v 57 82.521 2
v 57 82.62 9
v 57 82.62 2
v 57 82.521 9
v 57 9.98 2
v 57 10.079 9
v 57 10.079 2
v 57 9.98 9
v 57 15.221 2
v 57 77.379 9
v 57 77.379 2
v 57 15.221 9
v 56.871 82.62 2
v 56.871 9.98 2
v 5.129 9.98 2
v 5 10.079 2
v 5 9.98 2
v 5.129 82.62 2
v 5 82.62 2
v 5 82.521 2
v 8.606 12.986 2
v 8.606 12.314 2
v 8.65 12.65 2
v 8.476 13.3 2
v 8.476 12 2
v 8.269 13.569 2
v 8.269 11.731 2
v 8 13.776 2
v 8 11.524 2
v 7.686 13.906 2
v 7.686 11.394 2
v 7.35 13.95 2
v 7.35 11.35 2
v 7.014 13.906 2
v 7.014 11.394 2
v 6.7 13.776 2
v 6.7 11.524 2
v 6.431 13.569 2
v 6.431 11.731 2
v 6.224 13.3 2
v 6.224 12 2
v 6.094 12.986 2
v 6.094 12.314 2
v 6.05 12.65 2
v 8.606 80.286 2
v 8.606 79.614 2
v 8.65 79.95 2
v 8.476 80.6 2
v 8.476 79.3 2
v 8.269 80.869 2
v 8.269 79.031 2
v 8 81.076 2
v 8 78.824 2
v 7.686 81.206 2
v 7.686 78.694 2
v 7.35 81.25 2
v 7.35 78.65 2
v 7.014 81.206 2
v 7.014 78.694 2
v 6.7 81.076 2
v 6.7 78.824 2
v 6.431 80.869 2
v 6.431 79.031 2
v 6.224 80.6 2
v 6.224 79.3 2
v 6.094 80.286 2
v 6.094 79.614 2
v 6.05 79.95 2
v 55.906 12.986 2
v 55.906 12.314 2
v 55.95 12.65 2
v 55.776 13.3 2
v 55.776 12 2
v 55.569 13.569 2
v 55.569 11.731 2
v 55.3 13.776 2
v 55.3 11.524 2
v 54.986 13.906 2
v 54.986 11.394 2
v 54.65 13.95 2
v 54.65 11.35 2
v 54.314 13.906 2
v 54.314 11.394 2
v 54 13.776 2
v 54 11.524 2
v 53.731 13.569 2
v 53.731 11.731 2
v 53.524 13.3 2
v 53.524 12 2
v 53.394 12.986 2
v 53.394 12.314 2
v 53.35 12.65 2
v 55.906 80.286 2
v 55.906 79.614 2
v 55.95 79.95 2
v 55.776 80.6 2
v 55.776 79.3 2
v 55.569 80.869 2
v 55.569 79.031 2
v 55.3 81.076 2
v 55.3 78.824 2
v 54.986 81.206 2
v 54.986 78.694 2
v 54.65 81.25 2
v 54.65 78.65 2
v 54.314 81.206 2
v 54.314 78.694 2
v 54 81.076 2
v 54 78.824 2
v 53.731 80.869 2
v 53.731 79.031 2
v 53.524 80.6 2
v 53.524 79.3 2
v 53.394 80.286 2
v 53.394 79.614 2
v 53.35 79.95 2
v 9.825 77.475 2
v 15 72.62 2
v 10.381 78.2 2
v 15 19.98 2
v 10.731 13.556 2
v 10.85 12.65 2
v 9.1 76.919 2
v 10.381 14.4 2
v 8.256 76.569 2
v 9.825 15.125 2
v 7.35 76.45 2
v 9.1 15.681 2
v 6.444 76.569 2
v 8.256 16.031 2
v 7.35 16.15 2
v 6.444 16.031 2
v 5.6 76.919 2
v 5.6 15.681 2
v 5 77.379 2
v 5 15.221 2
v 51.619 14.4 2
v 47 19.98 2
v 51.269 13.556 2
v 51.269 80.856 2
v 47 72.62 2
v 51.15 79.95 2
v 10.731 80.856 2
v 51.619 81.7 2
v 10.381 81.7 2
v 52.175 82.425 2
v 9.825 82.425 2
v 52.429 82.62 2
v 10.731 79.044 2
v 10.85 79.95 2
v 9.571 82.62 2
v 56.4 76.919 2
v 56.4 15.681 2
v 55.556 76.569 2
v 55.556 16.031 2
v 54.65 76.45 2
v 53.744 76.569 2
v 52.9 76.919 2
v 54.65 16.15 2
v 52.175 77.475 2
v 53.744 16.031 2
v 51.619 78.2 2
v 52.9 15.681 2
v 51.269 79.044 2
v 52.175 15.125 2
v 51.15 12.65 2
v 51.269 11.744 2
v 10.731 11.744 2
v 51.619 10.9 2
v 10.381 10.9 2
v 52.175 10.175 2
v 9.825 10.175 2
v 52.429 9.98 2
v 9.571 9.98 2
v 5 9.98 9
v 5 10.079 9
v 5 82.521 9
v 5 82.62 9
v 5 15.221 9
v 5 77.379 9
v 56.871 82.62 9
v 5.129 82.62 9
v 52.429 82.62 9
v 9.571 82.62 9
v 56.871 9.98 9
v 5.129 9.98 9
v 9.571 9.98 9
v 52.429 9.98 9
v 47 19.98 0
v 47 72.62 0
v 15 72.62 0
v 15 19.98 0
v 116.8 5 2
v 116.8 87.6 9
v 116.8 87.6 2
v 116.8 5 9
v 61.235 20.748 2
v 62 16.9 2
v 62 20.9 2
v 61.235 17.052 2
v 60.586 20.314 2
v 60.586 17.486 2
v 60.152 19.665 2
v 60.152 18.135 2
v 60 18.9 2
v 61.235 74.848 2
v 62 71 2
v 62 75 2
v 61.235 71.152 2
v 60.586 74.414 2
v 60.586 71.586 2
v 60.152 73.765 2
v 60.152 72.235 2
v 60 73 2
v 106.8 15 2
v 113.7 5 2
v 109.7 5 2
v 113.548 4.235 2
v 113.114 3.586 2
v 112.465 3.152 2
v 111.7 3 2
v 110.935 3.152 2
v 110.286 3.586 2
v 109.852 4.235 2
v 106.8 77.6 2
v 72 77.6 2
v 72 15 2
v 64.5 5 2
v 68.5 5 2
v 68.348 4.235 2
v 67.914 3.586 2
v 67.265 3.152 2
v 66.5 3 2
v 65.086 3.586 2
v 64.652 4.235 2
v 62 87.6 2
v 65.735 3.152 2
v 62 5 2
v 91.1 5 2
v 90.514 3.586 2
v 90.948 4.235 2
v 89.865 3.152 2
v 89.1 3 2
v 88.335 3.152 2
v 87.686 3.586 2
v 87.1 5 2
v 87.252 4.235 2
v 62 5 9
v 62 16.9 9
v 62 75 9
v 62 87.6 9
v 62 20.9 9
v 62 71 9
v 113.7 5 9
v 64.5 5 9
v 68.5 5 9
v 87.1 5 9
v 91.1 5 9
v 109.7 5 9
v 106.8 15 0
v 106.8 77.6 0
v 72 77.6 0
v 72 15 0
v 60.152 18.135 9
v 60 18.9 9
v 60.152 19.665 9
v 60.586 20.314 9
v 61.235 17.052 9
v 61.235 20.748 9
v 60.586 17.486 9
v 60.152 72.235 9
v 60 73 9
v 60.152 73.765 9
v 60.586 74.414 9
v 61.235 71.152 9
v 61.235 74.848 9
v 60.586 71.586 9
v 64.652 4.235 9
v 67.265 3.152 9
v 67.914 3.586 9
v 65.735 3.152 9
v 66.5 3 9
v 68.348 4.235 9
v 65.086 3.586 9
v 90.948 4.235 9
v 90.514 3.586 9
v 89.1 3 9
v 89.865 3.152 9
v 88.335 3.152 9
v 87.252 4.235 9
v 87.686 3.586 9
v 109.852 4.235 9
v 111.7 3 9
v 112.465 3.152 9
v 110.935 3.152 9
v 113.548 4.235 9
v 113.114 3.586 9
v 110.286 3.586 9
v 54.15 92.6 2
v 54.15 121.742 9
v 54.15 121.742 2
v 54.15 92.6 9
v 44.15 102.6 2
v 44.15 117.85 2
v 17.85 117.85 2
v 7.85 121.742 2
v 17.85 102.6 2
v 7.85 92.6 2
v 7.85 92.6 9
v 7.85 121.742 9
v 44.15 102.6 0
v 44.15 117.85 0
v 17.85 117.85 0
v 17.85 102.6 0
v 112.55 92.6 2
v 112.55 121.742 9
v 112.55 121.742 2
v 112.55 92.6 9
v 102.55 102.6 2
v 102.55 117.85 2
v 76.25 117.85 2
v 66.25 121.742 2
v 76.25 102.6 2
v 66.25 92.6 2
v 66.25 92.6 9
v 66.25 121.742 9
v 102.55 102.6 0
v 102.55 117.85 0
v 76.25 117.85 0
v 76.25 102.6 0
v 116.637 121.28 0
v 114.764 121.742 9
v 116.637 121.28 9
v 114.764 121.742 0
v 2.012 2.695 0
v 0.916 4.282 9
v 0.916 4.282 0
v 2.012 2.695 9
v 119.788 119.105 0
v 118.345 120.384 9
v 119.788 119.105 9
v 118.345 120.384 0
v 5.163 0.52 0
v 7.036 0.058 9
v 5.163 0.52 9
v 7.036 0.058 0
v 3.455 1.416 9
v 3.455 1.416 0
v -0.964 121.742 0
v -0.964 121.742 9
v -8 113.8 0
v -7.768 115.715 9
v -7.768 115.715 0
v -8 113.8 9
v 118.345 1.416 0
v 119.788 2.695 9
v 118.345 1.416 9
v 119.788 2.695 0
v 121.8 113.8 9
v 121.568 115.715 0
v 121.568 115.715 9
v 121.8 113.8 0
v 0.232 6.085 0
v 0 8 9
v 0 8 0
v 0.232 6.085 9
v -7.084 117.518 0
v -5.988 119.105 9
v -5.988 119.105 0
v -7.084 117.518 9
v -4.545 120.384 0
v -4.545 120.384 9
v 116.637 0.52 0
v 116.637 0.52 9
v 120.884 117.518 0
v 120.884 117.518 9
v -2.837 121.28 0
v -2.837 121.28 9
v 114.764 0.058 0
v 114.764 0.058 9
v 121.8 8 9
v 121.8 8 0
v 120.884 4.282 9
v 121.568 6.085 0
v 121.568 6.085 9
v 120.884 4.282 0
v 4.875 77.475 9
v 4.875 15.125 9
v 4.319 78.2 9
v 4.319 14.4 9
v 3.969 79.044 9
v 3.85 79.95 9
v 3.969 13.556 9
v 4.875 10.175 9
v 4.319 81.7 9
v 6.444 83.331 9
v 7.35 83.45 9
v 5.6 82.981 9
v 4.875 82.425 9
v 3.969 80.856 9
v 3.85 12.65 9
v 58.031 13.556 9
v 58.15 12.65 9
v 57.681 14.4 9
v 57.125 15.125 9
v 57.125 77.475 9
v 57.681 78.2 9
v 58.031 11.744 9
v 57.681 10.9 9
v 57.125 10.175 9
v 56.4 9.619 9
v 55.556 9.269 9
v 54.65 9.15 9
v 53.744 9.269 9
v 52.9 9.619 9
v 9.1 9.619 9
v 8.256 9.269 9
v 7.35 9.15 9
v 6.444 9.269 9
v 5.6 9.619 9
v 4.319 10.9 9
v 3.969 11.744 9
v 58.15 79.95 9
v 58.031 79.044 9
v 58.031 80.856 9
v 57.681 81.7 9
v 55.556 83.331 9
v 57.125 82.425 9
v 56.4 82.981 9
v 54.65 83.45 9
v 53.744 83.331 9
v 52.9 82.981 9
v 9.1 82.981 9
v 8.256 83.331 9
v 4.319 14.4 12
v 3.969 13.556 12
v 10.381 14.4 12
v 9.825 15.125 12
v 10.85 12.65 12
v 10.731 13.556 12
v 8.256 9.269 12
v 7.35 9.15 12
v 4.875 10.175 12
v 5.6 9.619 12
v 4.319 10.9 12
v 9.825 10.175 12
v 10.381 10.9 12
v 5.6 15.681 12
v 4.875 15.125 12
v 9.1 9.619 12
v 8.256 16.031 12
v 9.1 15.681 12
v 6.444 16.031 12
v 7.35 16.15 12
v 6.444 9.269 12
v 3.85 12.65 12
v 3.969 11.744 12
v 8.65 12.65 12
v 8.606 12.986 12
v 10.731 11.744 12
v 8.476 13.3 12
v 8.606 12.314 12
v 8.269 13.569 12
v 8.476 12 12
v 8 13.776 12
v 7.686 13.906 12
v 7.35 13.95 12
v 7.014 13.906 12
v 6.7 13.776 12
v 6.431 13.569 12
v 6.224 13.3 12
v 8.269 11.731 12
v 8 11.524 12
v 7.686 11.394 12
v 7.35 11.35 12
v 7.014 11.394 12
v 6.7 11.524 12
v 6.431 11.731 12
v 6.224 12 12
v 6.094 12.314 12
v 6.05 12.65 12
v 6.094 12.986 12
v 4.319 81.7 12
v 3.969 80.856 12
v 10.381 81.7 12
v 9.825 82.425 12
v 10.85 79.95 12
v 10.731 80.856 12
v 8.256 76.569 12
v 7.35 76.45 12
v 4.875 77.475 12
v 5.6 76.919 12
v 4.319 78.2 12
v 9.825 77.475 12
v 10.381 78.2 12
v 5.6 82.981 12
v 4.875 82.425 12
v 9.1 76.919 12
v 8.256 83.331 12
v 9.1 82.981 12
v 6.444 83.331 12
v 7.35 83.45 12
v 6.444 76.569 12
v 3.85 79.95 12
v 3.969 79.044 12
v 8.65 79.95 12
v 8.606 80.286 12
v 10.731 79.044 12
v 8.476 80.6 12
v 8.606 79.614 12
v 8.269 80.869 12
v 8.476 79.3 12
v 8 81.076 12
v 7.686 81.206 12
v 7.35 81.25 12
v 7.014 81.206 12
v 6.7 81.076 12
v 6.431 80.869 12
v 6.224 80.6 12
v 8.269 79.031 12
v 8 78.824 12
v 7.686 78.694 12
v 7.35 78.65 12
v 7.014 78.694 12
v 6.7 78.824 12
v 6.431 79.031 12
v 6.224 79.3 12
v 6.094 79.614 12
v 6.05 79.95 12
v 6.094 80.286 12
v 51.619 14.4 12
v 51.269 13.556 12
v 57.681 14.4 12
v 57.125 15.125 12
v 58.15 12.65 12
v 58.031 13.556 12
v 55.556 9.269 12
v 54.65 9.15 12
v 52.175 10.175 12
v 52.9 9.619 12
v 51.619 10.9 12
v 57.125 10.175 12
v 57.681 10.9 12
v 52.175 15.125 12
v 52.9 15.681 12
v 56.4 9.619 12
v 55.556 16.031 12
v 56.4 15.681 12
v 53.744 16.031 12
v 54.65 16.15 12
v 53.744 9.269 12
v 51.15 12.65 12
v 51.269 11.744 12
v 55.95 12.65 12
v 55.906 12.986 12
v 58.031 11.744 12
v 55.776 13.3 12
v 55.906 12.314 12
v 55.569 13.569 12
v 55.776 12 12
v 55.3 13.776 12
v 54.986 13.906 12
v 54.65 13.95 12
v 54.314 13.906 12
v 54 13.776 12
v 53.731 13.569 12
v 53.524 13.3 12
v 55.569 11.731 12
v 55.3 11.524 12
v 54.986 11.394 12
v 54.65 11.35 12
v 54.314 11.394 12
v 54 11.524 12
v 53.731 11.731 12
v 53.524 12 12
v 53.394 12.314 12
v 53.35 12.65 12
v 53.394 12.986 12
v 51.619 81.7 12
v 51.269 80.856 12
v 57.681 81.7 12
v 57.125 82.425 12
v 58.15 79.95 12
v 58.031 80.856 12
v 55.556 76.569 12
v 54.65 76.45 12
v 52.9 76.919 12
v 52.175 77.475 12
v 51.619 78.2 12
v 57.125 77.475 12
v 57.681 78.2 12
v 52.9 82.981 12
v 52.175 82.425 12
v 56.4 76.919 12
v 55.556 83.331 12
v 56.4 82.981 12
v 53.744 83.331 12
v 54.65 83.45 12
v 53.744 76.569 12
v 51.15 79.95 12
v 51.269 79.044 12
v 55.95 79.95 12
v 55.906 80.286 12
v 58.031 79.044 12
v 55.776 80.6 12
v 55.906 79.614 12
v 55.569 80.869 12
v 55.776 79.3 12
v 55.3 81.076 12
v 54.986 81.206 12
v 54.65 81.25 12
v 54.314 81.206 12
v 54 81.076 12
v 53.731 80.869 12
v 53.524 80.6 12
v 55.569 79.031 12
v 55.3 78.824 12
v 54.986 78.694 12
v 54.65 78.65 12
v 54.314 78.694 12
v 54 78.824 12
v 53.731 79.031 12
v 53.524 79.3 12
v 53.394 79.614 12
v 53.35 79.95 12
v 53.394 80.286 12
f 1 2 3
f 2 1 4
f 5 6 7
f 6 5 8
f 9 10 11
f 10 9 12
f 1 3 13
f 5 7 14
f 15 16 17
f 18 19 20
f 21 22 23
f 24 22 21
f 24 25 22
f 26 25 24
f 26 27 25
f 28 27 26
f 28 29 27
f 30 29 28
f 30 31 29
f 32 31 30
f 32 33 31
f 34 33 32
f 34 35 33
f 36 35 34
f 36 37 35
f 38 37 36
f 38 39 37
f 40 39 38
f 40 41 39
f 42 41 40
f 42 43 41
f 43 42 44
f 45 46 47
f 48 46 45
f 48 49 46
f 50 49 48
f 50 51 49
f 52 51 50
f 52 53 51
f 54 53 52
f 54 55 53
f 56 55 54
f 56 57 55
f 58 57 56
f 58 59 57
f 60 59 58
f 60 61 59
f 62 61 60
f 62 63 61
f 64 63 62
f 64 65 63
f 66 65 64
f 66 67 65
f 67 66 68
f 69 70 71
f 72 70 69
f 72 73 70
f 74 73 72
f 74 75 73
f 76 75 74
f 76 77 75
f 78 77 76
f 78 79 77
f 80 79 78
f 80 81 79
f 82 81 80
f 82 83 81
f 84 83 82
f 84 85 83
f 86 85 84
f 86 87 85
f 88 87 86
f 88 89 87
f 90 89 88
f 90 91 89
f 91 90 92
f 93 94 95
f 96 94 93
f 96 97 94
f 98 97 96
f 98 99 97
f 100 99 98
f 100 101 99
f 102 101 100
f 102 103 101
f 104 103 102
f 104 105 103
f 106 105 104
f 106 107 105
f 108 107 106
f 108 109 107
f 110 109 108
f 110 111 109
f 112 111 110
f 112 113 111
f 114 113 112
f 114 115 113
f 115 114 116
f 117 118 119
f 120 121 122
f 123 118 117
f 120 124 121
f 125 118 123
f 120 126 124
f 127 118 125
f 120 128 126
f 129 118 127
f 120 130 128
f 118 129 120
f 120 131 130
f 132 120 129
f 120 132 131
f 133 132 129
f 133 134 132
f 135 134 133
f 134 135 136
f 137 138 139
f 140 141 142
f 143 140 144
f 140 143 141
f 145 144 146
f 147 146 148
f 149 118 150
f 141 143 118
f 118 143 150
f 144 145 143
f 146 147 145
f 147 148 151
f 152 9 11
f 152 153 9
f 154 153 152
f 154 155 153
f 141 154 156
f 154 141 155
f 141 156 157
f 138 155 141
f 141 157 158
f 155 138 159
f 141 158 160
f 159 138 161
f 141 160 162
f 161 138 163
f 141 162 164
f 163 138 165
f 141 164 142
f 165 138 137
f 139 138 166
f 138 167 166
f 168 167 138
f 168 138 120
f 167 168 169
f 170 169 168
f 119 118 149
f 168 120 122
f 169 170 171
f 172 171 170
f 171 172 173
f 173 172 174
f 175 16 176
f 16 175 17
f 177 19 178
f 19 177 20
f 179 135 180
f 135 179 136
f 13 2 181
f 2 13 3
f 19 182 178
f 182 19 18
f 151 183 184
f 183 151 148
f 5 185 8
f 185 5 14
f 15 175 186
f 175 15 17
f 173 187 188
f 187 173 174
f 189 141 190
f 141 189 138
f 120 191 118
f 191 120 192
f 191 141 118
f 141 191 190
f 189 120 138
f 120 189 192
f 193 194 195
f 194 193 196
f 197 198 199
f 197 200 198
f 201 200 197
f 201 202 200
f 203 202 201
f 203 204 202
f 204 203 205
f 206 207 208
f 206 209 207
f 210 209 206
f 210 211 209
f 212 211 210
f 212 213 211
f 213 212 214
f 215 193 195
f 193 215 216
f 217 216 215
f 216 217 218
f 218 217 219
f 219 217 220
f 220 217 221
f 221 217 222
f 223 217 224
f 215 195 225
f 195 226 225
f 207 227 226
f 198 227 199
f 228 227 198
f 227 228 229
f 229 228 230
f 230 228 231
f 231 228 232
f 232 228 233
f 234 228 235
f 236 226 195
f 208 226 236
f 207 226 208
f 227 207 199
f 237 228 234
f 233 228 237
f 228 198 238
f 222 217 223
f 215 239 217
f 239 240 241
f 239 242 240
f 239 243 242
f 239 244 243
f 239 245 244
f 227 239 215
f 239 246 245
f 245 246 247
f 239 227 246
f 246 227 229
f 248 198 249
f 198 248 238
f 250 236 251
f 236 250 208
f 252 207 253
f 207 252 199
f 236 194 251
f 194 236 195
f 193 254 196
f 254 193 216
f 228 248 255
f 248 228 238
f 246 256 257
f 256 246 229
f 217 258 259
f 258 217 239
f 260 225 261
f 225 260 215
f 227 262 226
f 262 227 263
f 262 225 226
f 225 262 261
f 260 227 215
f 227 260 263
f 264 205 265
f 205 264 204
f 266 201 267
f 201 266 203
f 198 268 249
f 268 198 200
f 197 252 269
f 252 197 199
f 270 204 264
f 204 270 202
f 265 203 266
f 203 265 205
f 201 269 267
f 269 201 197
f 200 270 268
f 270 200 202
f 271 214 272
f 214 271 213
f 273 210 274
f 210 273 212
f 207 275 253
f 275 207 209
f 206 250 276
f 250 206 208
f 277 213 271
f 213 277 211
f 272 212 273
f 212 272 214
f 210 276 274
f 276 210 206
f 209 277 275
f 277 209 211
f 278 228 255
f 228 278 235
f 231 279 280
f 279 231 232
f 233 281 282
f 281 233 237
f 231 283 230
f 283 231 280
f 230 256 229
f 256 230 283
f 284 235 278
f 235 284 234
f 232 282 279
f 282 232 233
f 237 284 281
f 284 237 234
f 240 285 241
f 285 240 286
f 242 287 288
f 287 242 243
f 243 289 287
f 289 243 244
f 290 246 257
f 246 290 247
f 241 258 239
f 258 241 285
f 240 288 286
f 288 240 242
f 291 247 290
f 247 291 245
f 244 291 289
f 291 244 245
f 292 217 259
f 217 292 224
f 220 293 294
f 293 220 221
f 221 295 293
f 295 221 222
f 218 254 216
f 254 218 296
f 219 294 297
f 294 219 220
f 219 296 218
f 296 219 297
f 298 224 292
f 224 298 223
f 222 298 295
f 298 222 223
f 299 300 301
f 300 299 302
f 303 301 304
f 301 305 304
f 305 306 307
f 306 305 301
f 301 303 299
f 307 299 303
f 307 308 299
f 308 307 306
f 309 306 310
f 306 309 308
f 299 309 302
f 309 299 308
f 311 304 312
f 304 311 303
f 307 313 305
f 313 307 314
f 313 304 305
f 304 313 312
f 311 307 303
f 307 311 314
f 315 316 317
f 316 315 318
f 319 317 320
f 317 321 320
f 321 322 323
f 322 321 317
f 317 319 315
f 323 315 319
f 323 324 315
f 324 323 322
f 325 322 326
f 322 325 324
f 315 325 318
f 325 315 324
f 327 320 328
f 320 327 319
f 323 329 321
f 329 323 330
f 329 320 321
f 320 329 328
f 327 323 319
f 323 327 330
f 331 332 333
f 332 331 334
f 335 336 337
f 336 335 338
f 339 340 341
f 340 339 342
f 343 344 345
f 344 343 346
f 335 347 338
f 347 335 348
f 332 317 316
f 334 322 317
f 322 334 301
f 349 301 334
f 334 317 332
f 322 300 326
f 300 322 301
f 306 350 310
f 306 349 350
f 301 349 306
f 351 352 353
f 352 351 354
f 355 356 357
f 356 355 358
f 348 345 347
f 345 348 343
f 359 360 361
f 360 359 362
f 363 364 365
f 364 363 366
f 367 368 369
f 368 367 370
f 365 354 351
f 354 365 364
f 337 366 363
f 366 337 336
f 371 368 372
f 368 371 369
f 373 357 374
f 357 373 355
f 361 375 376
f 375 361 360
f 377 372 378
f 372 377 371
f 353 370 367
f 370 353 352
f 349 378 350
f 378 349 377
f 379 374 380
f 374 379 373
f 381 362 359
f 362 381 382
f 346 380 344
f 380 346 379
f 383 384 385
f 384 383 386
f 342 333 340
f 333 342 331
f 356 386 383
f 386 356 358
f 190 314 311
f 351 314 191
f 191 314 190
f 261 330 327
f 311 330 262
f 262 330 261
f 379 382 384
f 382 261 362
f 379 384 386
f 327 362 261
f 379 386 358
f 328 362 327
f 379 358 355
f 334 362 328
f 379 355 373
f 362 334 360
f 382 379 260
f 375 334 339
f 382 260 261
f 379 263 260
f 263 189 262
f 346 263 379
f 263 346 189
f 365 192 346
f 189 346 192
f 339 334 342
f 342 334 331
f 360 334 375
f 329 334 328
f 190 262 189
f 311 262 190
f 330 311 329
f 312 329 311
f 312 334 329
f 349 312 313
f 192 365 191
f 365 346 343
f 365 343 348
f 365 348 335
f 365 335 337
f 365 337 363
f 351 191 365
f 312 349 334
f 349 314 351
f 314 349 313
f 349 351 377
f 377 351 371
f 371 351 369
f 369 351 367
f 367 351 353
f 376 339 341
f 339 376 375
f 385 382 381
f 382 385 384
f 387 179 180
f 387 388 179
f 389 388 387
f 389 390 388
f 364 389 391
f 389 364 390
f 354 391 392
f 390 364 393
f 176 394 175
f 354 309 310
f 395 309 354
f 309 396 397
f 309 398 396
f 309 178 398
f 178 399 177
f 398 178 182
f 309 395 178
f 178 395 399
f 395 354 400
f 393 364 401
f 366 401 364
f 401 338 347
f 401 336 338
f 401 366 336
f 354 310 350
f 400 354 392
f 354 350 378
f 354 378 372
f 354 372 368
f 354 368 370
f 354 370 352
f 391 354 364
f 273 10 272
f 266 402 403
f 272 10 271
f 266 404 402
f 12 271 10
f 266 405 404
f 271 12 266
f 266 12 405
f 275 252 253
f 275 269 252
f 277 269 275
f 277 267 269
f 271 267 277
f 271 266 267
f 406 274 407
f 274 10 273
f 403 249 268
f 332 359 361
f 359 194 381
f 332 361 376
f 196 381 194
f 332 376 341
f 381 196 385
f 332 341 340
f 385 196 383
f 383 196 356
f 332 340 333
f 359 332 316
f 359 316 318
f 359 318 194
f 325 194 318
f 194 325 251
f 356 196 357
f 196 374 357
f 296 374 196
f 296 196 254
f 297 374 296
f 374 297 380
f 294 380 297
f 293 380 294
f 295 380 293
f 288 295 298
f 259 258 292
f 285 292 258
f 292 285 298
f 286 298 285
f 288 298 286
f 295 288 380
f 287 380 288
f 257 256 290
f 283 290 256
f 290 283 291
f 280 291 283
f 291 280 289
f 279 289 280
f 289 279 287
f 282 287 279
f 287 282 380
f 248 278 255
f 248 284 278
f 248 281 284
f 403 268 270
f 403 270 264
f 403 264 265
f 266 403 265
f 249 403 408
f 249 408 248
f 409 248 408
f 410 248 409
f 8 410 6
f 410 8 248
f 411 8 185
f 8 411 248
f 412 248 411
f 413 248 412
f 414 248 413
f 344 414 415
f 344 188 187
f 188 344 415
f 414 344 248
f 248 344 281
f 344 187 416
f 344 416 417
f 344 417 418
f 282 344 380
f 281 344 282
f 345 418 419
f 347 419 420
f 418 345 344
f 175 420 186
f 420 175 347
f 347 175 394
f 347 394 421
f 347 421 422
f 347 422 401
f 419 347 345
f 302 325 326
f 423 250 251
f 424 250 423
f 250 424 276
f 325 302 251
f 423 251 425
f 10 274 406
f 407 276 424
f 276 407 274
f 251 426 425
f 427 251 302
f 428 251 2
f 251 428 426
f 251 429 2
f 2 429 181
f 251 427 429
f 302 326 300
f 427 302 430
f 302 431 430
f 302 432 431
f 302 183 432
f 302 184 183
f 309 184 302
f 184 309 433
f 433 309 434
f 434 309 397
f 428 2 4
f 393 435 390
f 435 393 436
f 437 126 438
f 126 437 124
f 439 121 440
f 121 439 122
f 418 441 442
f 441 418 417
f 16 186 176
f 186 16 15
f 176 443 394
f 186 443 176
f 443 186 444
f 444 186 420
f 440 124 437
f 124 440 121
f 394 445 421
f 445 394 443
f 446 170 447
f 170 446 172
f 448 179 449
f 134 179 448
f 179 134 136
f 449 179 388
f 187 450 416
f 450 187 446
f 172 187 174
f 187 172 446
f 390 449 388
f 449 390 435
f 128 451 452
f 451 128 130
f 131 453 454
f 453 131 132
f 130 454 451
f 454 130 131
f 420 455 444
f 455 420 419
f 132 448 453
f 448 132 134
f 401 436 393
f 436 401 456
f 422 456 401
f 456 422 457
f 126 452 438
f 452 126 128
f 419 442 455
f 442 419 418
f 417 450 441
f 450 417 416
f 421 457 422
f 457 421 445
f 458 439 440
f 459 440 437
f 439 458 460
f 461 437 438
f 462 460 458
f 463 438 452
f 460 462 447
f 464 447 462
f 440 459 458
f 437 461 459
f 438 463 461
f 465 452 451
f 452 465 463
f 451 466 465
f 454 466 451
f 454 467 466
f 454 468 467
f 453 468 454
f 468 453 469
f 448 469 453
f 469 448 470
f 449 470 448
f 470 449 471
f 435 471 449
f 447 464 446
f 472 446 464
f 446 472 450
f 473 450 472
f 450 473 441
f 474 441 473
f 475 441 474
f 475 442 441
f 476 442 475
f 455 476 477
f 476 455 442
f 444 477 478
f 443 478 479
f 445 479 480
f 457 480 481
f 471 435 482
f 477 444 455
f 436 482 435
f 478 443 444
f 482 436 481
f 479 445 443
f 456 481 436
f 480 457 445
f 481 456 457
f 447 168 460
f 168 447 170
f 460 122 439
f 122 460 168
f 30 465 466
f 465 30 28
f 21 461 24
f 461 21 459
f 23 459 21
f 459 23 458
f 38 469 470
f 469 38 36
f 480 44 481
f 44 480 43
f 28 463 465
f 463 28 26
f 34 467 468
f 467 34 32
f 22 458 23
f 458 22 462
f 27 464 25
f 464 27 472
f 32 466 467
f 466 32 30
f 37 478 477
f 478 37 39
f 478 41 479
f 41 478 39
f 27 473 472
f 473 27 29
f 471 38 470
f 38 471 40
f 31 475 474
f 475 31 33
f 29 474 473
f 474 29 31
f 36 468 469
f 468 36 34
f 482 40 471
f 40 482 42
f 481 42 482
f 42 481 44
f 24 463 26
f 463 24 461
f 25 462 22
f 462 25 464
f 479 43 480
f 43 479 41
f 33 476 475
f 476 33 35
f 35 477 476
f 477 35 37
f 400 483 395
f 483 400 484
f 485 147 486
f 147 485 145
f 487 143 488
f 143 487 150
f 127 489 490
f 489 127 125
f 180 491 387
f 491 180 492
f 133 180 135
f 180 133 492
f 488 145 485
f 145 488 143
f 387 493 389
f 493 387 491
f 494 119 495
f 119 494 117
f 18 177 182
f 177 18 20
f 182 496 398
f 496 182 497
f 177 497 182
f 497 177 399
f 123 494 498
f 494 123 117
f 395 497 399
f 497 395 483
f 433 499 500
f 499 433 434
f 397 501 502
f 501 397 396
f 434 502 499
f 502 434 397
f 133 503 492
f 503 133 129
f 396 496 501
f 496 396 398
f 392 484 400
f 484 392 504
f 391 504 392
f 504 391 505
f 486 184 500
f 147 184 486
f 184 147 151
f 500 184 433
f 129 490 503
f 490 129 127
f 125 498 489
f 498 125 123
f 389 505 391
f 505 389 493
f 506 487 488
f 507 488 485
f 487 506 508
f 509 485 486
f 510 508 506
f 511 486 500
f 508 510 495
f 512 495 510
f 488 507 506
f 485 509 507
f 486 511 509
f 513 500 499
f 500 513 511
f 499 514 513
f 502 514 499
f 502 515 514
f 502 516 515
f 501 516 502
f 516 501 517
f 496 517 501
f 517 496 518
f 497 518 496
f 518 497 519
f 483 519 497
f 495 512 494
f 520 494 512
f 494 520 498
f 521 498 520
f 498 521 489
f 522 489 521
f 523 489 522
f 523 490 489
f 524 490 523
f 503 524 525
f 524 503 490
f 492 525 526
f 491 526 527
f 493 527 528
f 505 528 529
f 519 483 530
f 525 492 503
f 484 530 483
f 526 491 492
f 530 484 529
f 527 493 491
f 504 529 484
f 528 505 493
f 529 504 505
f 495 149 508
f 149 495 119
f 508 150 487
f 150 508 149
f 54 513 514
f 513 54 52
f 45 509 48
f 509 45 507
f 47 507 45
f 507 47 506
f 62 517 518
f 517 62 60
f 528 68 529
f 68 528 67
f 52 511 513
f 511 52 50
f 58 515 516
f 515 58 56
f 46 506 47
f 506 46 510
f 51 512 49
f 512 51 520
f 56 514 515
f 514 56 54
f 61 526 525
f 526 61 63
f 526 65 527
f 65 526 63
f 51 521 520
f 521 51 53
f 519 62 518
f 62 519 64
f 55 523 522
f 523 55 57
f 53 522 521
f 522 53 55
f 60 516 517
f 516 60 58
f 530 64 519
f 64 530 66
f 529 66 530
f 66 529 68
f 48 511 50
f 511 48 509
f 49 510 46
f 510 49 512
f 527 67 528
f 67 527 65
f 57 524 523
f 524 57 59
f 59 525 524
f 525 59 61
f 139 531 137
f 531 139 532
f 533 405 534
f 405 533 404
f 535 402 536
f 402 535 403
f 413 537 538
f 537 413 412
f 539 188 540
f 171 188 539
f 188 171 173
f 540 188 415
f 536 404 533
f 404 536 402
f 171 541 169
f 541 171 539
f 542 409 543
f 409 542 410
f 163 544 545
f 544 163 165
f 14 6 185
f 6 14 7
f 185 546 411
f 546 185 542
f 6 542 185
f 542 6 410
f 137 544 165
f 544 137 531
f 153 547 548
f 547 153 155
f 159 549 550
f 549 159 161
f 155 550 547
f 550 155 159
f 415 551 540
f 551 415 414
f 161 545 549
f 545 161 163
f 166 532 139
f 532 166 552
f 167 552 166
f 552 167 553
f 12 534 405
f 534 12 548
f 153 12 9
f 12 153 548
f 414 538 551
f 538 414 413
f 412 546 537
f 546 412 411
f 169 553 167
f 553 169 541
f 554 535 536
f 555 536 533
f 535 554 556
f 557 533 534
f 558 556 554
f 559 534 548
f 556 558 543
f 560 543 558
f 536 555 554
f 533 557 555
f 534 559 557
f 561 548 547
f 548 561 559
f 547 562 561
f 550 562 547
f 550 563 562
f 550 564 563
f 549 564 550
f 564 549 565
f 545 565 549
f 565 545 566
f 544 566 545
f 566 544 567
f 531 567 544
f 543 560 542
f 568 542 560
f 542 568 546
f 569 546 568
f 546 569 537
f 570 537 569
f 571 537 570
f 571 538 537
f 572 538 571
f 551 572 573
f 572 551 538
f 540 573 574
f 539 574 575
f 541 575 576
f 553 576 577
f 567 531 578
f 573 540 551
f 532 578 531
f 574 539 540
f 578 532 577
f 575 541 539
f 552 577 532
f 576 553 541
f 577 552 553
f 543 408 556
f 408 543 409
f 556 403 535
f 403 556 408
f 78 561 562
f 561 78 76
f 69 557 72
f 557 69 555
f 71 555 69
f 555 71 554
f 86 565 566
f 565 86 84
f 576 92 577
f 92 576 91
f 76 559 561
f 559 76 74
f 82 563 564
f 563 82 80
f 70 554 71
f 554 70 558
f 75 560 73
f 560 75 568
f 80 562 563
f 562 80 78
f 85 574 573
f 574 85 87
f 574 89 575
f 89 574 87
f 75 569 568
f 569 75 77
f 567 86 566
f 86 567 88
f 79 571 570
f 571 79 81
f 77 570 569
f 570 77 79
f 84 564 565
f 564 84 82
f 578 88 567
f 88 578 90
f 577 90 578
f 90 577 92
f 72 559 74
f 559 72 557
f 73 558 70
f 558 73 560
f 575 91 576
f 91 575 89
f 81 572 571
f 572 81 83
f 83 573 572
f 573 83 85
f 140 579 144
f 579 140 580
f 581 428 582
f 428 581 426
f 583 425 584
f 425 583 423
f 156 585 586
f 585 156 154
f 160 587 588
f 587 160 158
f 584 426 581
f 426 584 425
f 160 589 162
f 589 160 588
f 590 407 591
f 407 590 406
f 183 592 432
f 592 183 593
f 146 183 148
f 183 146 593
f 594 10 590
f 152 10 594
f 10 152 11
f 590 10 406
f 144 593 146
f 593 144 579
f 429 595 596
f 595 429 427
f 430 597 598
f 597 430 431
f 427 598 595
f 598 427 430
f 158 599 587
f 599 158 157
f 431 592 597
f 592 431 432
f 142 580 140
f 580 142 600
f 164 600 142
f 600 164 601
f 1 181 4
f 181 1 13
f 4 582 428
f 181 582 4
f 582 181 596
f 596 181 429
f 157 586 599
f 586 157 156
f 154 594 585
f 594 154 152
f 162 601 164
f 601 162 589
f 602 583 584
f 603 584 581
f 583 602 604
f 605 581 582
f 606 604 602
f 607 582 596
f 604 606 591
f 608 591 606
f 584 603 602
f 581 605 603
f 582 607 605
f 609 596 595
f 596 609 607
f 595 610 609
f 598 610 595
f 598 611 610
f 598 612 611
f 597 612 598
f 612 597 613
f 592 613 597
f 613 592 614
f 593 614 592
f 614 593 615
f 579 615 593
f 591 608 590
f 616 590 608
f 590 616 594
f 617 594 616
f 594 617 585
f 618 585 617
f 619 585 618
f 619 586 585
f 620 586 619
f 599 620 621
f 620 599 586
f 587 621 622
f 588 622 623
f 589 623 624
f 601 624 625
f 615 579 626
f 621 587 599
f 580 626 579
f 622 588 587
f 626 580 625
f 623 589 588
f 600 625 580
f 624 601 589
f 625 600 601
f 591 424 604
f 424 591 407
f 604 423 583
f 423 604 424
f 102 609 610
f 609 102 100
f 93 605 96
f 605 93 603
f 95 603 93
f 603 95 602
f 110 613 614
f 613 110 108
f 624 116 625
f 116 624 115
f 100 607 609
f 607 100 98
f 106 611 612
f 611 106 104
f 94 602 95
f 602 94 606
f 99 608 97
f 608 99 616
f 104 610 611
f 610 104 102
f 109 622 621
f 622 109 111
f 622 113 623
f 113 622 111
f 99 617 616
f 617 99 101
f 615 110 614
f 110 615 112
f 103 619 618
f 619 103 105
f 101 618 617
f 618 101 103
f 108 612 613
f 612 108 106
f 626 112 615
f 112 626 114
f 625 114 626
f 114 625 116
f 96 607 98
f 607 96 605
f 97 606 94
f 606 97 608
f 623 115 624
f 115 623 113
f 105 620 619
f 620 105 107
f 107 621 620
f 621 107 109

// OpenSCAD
// file: roundedsquare.scad
module roundedSquare(size=[10,10], radius=1, center=false) {
    translate(center ? -size/2 : [0,0])
    hull() {
        translate([radius,radius]) circle(r=radius);
        translate([size[0]-radius,radius]) circle(r=radius);
        translate([size[0]-radius,size[0]-radius]) circle(r=radius);
        translate([0,size[0]-radius]) circle(r=radius);
    }
}
// main file
use <roundedsquare.scad>;

baseThickness = 2;
spacing = 5;
corner = 8;
undersideRimWidth = 10;
rimHeight = 7;

fpgaSizeX = 52;
fpgaSizeY = 72.64;
fpgaScrewSpacingX = 47.3;
fpgaScrewSpacingY = 67.3;


breadboardTolerance = 0.3;

// set to zero to omit small breadboards
smallBreadboardSizeX = 45.7;
smallBreadboardSizeY = 34.65;

bigBreadboardSizeX = 54.2;
bigBreadboardSizeY = 82;

bigBreadboardNubDiameter = 4;
bigBreadboardNubPositions = [ [0,13.9], [0,68], [4.5,0], [27.1,0], [49.7,0] ];

screwHoleSize = 2.6;
screwLength = 10;
screwPillarDiameter = 7;
fpgaHeightAboveBottom = 12;

module dummy() {}

nudge = 0.01;

smallBB = smallBreadboardSizeX > 0 && smallBreadboardSizeY > 0;

row1Height = max(fpgaSizeY, bigBreadboardSizeY+2*breadboardTolerance);
row2Height = smallBreadboardSizeY+2*breadboardTolerance;
col1Width = max(fpgaSizeX, smallBreadboardSizeX+2*breadboardTolerance);
col2Width = max(bigBreadboardSizeX+2*breadboardTolerance,smallBreadboardSizeX+2*breadboardTolerance);
width = col1Width+col2Width+3*spacing;
height = smallBB ? (row1Height+row2Height+3*spacing) : (row1Height+2*spacing);

col1X = spacing+0.5*col1Width;
col2X = 2*spacing+col1Width+0.5*col2Width;
row1Y = spacing+0.5*row1Height;
row2Y = row1Height+2*spacing+0.5*row2Height;

fpgaHoleXSize = fpgaSizeX-2*undersideRimWidth;
fpgaHoleYSize = fpgaSizeY-2*undersideRimWidth;

// cube centered in xy plane
module cCube(dimensions) {
    translate([-dimensions[0]/2,-dimensions[1]/2,0]) cube(dimensions);
}

module cutout(w,h) {
    translate([0,0,baseThickness]) cCube([w,h,rimHeight+nudge]);
    translate([0,0,-nudge]) cCube([w-2*undersideRimWidth,h-2*undersideRimWidth,baseThickness+2*nudge]);
}

module removers(x,y,width,height) {
    translate([x-width/2,y,baseThickness]) scale([0.9,1.25,1]) cylinder(d=spacing,h=rimHeight+nudge,$fn=36);
    translate([x+width/2,y,baseThickness]) scale([0.9,1.25,1])cylinder(d=spacing,h=rimHeight+nudge,$fn=36);
}

module screwPillar() {
    $fn = 24;
    render(convexity=2)
    difference() {
        cylinder(d=screwPillarDiameter,h=fpgaHeightAboveBottom);
        translate([0,0,fpgaHeightAboveBottom-screwLength])
        cylinder(d=screwHoleSize,h=screwLength+nudge);
    }
}

render(convexity=4)
difference() {
    linear_extrude(rimHeight+baseThickness) roundedSquare([width,height],radius=corner);
    translate([col1X,row1Y,0]) cutout(fpgaSizeX,fpgaSizeY);
    translate([col2X,row1Y,0]) cutout(bigBreadboardSizeX+2*breadboardTolerance,bigBreadboardSizeY+2*breadboardTolerance);
//    removers(col2X,row1Y,bigBreadboardSizeX+2*breadboardTolerance,bigBreadboardSizeY+2*breadboardTolerance);
    for (xy=bigBreadboardNubPositions) 
        translate([col2X-(bigBreadboardSizeX+2*breadboardTolerance)/2+xy[0],row1Y-(bigBreadboardSizeY+2*breadboardTolerance)/2+xy[1],baseThickness]) cylinder(d=bigBreadboardNubDiameter,h=rimHeight+nudge,$fn=16);
    if (smallBB) {
 //       removers(col1X,row2Y,smallBreadboardSizeX+2*breadboardTolerance,smallBreadboardSizeY+2*breadboardTolerance);
//        removers(col2X,row2Y,smallBreadboardSizeX+2*breadboardTolerance,smallBreadboardSizeY+2*breadboardTolerance);
        translate([col1X,row2Y,0]) cutout(smallBreadboardSizeX+2*breadboardTolerance,smallBreadboardSizeY+2*breadboardTolerance);
        translate([col2X,row2Y,0]) cutout(smallBreadboardSizeX+2*breadboardTolerance,smallBreadboardSizeY+2*breadboardTolerance);
    }
}

for (i=[-1:2:1]) for(j=[-1:2:1]) 
    translate([col1X+i*0.5*fpgaScrewSpacingX,row1Y+j*0.5*fpgaScrewSpacingY,0]) screwPillar();
